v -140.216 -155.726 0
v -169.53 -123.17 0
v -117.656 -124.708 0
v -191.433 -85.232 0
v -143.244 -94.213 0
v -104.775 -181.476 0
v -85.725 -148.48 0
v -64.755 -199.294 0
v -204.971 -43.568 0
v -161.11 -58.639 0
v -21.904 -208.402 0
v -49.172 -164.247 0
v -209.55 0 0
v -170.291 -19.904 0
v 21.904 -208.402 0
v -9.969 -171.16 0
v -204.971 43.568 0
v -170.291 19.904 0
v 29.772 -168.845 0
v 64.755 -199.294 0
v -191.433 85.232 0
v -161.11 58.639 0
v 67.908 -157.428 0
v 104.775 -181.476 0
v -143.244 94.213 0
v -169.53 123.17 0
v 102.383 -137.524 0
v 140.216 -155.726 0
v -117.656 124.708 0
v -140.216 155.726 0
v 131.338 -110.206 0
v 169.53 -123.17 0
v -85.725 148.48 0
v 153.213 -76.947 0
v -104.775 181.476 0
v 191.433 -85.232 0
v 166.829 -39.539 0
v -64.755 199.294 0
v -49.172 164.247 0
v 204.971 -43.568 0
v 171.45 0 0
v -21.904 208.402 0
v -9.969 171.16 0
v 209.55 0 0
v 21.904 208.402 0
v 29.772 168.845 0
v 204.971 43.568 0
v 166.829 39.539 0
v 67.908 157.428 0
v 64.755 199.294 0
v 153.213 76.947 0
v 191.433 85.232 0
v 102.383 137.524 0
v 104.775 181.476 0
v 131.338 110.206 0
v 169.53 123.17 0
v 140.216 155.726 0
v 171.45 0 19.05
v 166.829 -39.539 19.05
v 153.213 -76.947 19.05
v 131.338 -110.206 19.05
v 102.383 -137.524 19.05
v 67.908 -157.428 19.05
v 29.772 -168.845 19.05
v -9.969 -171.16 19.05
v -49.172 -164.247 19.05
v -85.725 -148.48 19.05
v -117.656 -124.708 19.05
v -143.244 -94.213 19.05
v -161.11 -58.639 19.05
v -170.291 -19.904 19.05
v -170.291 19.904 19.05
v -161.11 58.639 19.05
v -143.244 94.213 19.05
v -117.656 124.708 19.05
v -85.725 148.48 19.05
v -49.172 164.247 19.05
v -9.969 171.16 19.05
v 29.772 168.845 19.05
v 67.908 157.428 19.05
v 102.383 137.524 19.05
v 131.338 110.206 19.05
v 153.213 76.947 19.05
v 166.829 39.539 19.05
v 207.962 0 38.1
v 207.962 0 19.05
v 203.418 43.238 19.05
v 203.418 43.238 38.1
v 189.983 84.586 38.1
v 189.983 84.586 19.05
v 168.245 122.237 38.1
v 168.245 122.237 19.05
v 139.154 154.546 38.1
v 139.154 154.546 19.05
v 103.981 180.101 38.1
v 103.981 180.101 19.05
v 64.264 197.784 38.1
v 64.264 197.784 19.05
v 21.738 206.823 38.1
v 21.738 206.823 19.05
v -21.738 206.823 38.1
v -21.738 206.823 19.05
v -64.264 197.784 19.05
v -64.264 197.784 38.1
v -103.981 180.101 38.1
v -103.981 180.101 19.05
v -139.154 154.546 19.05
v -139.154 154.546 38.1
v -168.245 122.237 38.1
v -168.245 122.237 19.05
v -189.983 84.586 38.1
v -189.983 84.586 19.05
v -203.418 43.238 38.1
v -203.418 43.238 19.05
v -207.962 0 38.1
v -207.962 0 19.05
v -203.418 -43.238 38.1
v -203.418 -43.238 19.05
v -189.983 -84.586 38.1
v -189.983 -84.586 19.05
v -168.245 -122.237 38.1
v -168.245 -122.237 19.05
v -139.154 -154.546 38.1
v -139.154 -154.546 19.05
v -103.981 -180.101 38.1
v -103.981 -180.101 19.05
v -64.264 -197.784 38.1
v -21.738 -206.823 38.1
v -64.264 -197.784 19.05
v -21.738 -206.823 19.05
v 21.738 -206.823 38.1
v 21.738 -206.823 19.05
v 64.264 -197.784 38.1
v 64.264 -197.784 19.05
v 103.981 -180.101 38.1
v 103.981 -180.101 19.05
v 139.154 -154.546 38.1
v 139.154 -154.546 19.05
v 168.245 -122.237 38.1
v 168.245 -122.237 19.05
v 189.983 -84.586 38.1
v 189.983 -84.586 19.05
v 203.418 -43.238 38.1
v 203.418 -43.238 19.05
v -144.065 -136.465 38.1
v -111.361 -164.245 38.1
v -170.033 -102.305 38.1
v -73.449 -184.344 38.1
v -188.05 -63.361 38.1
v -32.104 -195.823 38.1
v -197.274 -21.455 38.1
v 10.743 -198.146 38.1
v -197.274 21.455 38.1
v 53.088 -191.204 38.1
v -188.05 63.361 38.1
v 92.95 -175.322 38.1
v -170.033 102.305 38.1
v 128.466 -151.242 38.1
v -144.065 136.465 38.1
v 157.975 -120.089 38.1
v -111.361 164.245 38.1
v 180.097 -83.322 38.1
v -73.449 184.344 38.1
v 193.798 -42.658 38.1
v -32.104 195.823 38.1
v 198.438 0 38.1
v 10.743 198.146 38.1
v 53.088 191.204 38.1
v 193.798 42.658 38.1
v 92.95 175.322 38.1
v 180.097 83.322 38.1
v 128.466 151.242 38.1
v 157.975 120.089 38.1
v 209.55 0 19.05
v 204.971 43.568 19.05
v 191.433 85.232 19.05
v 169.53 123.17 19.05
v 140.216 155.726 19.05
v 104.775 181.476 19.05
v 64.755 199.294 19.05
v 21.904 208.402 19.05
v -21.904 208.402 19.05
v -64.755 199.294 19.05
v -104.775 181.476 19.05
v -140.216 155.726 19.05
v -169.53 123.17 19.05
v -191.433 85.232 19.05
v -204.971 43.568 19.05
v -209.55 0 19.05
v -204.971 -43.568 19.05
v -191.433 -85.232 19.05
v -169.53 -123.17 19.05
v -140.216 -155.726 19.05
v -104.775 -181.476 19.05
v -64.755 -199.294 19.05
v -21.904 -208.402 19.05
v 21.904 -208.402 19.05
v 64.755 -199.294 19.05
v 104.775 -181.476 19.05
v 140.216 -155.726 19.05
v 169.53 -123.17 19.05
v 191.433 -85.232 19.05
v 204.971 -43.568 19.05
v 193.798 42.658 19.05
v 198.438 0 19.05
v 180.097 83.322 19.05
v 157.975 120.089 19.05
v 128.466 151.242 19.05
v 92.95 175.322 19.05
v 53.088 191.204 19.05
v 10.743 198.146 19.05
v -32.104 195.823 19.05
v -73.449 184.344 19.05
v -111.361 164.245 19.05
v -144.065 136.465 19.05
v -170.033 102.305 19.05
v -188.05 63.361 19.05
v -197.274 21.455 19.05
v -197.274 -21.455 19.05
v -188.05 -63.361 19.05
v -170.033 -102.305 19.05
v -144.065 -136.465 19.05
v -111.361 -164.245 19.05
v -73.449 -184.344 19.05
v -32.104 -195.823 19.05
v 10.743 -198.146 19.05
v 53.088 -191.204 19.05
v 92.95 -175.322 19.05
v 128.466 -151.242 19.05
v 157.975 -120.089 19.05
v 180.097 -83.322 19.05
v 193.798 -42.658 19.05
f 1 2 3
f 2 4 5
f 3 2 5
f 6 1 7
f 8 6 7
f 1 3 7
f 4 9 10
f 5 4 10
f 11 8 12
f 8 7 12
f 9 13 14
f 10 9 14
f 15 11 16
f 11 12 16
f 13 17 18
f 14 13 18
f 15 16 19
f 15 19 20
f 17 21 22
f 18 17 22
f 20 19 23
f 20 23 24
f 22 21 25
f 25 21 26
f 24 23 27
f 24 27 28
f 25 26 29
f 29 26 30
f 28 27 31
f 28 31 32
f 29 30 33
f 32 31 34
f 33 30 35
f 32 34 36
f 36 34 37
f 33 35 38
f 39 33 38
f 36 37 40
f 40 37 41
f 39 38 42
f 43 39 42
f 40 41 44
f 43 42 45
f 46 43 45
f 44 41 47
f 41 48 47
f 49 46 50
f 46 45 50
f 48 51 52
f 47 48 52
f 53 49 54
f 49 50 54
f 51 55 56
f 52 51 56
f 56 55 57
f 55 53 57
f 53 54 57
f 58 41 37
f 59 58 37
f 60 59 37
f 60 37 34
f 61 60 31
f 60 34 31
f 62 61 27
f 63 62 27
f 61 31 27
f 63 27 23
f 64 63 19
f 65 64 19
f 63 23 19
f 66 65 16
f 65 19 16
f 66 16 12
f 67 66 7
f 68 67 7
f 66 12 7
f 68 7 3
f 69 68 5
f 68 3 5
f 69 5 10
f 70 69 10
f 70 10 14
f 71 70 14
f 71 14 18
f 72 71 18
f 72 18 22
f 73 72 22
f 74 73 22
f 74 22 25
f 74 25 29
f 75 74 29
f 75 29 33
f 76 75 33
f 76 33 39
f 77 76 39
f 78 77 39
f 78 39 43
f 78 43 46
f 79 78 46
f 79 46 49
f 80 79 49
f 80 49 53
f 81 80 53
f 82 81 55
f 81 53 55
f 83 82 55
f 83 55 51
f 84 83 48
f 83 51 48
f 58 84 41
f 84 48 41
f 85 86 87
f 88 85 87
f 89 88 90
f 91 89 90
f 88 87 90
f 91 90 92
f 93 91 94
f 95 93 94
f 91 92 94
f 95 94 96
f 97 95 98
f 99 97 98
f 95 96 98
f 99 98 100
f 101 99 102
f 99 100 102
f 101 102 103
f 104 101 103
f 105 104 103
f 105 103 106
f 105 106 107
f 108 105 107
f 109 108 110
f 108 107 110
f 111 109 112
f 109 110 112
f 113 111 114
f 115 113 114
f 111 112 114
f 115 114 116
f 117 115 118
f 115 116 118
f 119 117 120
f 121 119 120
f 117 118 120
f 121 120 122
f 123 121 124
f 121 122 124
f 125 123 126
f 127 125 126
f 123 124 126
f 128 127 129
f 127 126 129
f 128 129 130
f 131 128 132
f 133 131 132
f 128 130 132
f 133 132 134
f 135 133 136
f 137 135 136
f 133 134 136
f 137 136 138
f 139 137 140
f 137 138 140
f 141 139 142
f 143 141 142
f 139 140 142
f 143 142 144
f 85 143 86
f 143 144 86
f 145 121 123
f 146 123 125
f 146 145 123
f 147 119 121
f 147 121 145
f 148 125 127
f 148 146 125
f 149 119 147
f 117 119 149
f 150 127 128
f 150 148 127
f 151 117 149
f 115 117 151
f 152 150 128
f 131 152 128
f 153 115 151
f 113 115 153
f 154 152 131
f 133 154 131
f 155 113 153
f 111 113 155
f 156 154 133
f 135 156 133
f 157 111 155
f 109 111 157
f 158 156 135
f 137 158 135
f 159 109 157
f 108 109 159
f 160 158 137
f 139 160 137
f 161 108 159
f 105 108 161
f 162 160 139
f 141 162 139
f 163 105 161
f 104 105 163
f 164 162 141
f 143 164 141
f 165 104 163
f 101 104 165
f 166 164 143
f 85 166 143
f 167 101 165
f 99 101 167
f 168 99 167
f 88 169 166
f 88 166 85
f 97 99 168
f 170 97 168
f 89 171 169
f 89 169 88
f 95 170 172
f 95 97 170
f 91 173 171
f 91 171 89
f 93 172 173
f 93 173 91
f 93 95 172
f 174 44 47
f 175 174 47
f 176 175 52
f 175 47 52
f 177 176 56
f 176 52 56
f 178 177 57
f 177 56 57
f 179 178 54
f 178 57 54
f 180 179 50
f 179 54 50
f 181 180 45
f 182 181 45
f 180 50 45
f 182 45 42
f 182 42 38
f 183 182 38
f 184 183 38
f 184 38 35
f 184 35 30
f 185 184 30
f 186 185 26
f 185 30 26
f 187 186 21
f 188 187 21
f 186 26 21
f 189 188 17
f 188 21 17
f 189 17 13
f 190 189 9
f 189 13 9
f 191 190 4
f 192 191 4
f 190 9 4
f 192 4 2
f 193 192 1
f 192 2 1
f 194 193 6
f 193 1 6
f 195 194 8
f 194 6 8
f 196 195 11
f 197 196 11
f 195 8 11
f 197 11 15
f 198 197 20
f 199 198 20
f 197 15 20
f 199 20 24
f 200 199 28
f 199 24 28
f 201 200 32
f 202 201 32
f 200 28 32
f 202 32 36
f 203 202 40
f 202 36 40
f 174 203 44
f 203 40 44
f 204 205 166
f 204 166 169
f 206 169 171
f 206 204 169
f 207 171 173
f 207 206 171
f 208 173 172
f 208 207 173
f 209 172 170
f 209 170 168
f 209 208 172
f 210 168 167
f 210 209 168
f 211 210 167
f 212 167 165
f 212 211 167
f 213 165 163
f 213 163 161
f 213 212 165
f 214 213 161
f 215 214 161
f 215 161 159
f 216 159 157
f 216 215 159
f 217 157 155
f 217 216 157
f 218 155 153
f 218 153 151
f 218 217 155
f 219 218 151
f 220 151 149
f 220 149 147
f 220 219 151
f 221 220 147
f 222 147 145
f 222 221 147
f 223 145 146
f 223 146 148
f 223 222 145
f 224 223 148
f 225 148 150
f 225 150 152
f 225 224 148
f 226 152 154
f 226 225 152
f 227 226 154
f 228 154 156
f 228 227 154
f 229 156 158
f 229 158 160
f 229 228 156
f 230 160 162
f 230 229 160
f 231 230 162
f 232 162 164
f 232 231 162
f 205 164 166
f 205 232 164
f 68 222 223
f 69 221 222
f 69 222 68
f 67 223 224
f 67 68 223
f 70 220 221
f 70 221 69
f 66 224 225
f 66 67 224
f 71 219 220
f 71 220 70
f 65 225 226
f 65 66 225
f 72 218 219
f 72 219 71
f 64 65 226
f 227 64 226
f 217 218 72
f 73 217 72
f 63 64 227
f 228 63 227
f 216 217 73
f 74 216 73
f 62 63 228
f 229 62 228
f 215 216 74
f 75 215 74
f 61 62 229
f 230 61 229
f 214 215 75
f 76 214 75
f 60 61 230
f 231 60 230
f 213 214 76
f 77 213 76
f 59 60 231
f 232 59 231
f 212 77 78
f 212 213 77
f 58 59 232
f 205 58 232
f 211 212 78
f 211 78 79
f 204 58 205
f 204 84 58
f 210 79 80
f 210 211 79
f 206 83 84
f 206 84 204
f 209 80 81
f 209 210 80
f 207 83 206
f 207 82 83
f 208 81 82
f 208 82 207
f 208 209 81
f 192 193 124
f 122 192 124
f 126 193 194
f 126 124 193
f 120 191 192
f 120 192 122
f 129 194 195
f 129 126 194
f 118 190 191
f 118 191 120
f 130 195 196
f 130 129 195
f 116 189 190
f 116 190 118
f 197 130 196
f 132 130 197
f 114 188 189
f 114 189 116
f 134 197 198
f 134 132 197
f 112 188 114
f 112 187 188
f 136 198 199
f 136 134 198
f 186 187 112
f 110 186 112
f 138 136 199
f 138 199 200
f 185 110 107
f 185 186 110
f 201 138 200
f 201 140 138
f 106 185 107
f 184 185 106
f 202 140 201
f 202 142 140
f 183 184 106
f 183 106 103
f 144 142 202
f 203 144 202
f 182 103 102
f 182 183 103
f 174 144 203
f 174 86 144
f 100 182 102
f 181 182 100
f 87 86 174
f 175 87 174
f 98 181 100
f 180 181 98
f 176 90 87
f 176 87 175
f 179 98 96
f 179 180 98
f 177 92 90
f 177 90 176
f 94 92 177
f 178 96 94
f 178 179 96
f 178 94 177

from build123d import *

# Parameters (mm, degrees)
F0_R     = 209.55
F1_DEPTH = 19.05
F2_R     = 171.45
F3_DEPTH = 25.4
F4_R     = 207.9625
F4_R_2   = 198.4375
F5_DEPTH = 19.05


with BuildPart() as f1:
    # F0 (on Top) → F1 (new body)
    with BuildSketch(Plane.XY):
        Circle(F0_R)
    extrude(amount=F1_DEPTH)

    # F2 (on face) → F3 (cut)
    with BuildSketch(Plane(origin=(0, 0, 0), x_dir=(1, 0, 0), z_dir=(0, 0, -1))):
        Circle(F2_R)
    extrude(amount=-F3_DEPTH, mode=Mode.SUBTRACT)

    # F4 (on face) → F5 (join)
    with BuildSketch(Plane.XY.offset(19.05)):
        Circle(F4_R)
        Circle(F4_R_2, mode=Mode.SUBTRACT)
    extrude(amount=F5_DEPTH)


solid = f1.part
